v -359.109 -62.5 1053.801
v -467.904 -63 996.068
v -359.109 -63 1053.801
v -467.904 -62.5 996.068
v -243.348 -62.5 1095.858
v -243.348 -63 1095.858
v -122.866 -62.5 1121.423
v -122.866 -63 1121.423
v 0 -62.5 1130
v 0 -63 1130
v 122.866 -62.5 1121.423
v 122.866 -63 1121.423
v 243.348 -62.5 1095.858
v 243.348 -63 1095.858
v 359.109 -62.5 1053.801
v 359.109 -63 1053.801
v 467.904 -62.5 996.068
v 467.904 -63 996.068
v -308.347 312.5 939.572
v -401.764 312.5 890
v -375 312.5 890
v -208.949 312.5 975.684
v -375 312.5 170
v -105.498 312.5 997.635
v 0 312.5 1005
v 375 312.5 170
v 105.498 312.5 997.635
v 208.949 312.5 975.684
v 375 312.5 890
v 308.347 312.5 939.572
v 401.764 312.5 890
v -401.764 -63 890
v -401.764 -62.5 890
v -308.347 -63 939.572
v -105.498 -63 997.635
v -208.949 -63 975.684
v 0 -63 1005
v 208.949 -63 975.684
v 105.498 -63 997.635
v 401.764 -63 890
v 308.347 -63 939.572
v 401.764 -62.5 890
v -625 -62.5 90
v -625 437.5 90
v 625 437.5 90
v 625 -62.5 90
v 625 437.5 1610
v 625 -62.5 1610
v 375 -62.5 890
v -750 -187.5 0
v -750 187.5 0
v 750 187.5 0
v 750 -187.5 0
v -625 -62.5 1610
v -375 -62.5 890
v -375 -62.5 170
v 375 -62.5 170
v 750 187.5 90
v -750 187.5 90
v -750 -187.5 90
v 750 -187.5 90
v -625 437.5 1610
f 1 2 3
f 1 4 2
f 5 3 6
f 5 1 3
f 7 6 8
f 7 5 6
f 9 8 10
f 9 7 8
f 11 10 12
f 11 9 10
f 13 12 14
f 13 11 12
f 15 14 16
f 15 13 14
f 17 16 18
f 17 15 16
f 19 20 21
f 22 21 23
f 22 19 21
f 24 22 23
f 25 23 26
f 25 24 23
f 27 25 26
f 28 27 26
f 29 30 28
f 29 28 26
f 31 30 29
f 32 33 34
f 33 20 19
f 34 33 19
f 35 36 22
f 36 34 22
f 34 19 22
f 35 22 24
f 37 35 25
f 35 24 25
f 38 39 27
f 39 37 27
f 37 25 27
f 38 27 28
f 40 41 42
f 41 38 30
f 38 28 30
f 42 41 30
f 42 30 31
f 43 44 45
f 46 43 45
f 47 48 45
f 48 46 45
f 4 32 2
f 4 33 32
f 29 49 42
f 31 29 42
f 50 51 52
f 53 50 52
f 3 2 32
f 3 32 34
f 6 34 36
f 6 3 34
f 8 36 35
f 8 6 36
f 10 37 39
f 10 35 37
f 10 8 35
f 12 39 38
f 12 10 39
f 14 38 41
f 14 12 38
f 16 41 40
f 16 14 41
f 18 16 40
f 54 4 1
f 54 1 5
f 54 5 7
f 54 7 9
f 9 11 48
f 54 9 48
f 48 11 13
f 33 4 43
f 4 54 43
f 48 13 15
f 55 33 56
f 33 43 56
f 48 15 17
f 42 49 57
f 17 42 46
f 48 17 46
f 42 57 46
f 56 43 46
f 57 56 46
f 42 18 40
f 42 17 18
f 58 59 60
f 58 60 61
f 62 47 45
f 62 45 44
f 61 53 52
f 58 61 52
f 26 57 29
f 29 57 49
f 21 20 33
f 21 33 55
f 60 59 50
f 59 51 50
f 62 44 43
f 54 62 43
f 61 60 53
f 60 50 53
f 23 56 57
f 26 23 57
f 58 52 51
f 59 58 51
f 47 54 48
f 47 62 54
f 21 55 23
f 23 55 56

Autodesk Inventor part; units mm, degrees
ref_plane "YZ Plane" through (0, 0, 0) normal (1, 0, 0) x (0, 1, 0)
ref_plane "XZ Plane" through (0, 0, 0) normal (0, 1, 0) x (-1, 0, 0)
ref_plane "XY Plane" through (0, 0, 0) normal (0, 0, 1) x (1, 0, 0)
sketch "Эскиз1" plane through (0, 0, 0) normal (0, 0, 1) x (1, 0, 0)
  line L0 (-750, -187.5) -> (750, -187.5)
  line L1 (750, -187.5) -> (750, 187.5)
  line L2 (750, 187.5) -> (-750, 187.5)
  line L3 (-750, 187.5) -> (-750, -187.5)
  line L4 (-750, -187.5) -> (750, 187.5) construction
  line L5 (750, -187.5) -> (-750, 187.5) construction
  point P0 (0, 0)
  dimension "d0" = 1500
  dimension "d1" = 375
extrude "Выдавливание1" add sketch "Эскиз1" along normal blind 90
sketch "Эскиз2" plane through (0, 0, 90) normal (0, 0, 1) x (1, 0, 0)
  line L0 (-750, -187.5) -> (750, -187.5) construction
  line L1 (750, -187.5) -> (750, 187.5) construction
  line L2 (750, 187.5) -> (-750, 187.5) construction
  line L3 (-750, 187.5) -> (-750, -187.5) construction
  line L4 (-625, -62.5) -> (625, -62.5)
  line L5 (625, -62.5) -> (625, 437.5)
  line L6 (625, 437.5) -> (-625, 437.5)
  line L7 (-625, 437.5) -> (-625, -62.5)
  point P0 (0, 0)
  dimension "d4" = 1250
  dimension "d5" = 500
  dimension "d6" = 125
  dimension "d7" = 125
  dimension "d8" = 125
extrude "Выдавливание2" add sketch "Эскиз2" along normal blind 1520 separate body
sketch "Эскиз3" plane through (-625, -62.5, 90) normal (0, -1, 0) x (1, 0, 0)
  line L0 (0, 0) -> (1250, 0) construction
  line L1 (1250, 0) -> (1250, 1520) construction
  line L2 (0, 1520) -> (1250, 1520) construction
  line L3 (0, 0) -> (0, 1520) construction
  line L4 (250, 80) -> (1000, 80)
  line L5 (1000, 80) -> (1000, 800)
  line L6 (1000, 800) -> (250, 800)
  line L7 (250, 800) -> (250, 80)
  point P0 (625, -90)
  dimension "d11" = 720
  dimension "d12" = 250
  dimension "d13" = 250
  dimension "d14" = 80
extrude "Выдавливание3" cut sketch "Эскиз3" against normal blind 375 bodies 2
sketch "Эскиз4" plane through (-625, -62.5, 90) normal (0, -1, 0) x (1, 0, 0)
  line L0 (1000, 800) -> (1000, 80) construction
  line L1 (1000, 80) -> (250, 80) construction
  line L2 (250, 80) -> (250, 800) construction
  line L3 (250, 800) -> (1000, 800) construction
  line L4 (0, 0) -> (1250, 0) construction
  line L5 (1250, 0) -> (1250, 1520) construction
  line L6 (0, 1520) -> (1250, 1520) construction
  line L7 (0, 0) -> (0, 1520) construction
  line L8 (223.236, 800) -> (1026.764, 800)
  line L9 (1026.764, 800) -> (1026.764, 1040) construction
  line L10 (1026.764, 1040) -> (223.236, 1040) construction
  line L11 (223.236, 1040) -> (223.236, 800) construction
  arc A0 (1092.9044, 906.0681) -> (157.0956, 906.0681) centre (625, 155.6985) ccw
  line L12 (223.236, 800) -> (157.0956, 906.0681)
  line L13 (1092.9044, 906.0681) -> (1026.764, 800)
  arc A1 (1026.764, 800) -> (223.236, 800) centre (625, 155.6985) ccw
  point P0 (625, -90)
  point P1 (625, 1040)
  dimension "d17" = 240
  dimension "d18" = 26.764
  dimension "d19" = 26.764
  dimension "d20" = 125
extrude "Выдавливание4" cut sketch "Эскиз4" against normal blind 375 contours A1 L8 bodies 2
extrude "Выдавливание5" add sketch "Эскиз4" along normal blind 0.5 contours L12 A0 L13 A1 bodies 2
equation "\"d6\" = d7"
equation "\"d8\" = d7"
equation "\"d13\" = d12"
equation "\"d19\" = d18"
properties part number "Камин" material "Кирпич, обычный, коричневый"
